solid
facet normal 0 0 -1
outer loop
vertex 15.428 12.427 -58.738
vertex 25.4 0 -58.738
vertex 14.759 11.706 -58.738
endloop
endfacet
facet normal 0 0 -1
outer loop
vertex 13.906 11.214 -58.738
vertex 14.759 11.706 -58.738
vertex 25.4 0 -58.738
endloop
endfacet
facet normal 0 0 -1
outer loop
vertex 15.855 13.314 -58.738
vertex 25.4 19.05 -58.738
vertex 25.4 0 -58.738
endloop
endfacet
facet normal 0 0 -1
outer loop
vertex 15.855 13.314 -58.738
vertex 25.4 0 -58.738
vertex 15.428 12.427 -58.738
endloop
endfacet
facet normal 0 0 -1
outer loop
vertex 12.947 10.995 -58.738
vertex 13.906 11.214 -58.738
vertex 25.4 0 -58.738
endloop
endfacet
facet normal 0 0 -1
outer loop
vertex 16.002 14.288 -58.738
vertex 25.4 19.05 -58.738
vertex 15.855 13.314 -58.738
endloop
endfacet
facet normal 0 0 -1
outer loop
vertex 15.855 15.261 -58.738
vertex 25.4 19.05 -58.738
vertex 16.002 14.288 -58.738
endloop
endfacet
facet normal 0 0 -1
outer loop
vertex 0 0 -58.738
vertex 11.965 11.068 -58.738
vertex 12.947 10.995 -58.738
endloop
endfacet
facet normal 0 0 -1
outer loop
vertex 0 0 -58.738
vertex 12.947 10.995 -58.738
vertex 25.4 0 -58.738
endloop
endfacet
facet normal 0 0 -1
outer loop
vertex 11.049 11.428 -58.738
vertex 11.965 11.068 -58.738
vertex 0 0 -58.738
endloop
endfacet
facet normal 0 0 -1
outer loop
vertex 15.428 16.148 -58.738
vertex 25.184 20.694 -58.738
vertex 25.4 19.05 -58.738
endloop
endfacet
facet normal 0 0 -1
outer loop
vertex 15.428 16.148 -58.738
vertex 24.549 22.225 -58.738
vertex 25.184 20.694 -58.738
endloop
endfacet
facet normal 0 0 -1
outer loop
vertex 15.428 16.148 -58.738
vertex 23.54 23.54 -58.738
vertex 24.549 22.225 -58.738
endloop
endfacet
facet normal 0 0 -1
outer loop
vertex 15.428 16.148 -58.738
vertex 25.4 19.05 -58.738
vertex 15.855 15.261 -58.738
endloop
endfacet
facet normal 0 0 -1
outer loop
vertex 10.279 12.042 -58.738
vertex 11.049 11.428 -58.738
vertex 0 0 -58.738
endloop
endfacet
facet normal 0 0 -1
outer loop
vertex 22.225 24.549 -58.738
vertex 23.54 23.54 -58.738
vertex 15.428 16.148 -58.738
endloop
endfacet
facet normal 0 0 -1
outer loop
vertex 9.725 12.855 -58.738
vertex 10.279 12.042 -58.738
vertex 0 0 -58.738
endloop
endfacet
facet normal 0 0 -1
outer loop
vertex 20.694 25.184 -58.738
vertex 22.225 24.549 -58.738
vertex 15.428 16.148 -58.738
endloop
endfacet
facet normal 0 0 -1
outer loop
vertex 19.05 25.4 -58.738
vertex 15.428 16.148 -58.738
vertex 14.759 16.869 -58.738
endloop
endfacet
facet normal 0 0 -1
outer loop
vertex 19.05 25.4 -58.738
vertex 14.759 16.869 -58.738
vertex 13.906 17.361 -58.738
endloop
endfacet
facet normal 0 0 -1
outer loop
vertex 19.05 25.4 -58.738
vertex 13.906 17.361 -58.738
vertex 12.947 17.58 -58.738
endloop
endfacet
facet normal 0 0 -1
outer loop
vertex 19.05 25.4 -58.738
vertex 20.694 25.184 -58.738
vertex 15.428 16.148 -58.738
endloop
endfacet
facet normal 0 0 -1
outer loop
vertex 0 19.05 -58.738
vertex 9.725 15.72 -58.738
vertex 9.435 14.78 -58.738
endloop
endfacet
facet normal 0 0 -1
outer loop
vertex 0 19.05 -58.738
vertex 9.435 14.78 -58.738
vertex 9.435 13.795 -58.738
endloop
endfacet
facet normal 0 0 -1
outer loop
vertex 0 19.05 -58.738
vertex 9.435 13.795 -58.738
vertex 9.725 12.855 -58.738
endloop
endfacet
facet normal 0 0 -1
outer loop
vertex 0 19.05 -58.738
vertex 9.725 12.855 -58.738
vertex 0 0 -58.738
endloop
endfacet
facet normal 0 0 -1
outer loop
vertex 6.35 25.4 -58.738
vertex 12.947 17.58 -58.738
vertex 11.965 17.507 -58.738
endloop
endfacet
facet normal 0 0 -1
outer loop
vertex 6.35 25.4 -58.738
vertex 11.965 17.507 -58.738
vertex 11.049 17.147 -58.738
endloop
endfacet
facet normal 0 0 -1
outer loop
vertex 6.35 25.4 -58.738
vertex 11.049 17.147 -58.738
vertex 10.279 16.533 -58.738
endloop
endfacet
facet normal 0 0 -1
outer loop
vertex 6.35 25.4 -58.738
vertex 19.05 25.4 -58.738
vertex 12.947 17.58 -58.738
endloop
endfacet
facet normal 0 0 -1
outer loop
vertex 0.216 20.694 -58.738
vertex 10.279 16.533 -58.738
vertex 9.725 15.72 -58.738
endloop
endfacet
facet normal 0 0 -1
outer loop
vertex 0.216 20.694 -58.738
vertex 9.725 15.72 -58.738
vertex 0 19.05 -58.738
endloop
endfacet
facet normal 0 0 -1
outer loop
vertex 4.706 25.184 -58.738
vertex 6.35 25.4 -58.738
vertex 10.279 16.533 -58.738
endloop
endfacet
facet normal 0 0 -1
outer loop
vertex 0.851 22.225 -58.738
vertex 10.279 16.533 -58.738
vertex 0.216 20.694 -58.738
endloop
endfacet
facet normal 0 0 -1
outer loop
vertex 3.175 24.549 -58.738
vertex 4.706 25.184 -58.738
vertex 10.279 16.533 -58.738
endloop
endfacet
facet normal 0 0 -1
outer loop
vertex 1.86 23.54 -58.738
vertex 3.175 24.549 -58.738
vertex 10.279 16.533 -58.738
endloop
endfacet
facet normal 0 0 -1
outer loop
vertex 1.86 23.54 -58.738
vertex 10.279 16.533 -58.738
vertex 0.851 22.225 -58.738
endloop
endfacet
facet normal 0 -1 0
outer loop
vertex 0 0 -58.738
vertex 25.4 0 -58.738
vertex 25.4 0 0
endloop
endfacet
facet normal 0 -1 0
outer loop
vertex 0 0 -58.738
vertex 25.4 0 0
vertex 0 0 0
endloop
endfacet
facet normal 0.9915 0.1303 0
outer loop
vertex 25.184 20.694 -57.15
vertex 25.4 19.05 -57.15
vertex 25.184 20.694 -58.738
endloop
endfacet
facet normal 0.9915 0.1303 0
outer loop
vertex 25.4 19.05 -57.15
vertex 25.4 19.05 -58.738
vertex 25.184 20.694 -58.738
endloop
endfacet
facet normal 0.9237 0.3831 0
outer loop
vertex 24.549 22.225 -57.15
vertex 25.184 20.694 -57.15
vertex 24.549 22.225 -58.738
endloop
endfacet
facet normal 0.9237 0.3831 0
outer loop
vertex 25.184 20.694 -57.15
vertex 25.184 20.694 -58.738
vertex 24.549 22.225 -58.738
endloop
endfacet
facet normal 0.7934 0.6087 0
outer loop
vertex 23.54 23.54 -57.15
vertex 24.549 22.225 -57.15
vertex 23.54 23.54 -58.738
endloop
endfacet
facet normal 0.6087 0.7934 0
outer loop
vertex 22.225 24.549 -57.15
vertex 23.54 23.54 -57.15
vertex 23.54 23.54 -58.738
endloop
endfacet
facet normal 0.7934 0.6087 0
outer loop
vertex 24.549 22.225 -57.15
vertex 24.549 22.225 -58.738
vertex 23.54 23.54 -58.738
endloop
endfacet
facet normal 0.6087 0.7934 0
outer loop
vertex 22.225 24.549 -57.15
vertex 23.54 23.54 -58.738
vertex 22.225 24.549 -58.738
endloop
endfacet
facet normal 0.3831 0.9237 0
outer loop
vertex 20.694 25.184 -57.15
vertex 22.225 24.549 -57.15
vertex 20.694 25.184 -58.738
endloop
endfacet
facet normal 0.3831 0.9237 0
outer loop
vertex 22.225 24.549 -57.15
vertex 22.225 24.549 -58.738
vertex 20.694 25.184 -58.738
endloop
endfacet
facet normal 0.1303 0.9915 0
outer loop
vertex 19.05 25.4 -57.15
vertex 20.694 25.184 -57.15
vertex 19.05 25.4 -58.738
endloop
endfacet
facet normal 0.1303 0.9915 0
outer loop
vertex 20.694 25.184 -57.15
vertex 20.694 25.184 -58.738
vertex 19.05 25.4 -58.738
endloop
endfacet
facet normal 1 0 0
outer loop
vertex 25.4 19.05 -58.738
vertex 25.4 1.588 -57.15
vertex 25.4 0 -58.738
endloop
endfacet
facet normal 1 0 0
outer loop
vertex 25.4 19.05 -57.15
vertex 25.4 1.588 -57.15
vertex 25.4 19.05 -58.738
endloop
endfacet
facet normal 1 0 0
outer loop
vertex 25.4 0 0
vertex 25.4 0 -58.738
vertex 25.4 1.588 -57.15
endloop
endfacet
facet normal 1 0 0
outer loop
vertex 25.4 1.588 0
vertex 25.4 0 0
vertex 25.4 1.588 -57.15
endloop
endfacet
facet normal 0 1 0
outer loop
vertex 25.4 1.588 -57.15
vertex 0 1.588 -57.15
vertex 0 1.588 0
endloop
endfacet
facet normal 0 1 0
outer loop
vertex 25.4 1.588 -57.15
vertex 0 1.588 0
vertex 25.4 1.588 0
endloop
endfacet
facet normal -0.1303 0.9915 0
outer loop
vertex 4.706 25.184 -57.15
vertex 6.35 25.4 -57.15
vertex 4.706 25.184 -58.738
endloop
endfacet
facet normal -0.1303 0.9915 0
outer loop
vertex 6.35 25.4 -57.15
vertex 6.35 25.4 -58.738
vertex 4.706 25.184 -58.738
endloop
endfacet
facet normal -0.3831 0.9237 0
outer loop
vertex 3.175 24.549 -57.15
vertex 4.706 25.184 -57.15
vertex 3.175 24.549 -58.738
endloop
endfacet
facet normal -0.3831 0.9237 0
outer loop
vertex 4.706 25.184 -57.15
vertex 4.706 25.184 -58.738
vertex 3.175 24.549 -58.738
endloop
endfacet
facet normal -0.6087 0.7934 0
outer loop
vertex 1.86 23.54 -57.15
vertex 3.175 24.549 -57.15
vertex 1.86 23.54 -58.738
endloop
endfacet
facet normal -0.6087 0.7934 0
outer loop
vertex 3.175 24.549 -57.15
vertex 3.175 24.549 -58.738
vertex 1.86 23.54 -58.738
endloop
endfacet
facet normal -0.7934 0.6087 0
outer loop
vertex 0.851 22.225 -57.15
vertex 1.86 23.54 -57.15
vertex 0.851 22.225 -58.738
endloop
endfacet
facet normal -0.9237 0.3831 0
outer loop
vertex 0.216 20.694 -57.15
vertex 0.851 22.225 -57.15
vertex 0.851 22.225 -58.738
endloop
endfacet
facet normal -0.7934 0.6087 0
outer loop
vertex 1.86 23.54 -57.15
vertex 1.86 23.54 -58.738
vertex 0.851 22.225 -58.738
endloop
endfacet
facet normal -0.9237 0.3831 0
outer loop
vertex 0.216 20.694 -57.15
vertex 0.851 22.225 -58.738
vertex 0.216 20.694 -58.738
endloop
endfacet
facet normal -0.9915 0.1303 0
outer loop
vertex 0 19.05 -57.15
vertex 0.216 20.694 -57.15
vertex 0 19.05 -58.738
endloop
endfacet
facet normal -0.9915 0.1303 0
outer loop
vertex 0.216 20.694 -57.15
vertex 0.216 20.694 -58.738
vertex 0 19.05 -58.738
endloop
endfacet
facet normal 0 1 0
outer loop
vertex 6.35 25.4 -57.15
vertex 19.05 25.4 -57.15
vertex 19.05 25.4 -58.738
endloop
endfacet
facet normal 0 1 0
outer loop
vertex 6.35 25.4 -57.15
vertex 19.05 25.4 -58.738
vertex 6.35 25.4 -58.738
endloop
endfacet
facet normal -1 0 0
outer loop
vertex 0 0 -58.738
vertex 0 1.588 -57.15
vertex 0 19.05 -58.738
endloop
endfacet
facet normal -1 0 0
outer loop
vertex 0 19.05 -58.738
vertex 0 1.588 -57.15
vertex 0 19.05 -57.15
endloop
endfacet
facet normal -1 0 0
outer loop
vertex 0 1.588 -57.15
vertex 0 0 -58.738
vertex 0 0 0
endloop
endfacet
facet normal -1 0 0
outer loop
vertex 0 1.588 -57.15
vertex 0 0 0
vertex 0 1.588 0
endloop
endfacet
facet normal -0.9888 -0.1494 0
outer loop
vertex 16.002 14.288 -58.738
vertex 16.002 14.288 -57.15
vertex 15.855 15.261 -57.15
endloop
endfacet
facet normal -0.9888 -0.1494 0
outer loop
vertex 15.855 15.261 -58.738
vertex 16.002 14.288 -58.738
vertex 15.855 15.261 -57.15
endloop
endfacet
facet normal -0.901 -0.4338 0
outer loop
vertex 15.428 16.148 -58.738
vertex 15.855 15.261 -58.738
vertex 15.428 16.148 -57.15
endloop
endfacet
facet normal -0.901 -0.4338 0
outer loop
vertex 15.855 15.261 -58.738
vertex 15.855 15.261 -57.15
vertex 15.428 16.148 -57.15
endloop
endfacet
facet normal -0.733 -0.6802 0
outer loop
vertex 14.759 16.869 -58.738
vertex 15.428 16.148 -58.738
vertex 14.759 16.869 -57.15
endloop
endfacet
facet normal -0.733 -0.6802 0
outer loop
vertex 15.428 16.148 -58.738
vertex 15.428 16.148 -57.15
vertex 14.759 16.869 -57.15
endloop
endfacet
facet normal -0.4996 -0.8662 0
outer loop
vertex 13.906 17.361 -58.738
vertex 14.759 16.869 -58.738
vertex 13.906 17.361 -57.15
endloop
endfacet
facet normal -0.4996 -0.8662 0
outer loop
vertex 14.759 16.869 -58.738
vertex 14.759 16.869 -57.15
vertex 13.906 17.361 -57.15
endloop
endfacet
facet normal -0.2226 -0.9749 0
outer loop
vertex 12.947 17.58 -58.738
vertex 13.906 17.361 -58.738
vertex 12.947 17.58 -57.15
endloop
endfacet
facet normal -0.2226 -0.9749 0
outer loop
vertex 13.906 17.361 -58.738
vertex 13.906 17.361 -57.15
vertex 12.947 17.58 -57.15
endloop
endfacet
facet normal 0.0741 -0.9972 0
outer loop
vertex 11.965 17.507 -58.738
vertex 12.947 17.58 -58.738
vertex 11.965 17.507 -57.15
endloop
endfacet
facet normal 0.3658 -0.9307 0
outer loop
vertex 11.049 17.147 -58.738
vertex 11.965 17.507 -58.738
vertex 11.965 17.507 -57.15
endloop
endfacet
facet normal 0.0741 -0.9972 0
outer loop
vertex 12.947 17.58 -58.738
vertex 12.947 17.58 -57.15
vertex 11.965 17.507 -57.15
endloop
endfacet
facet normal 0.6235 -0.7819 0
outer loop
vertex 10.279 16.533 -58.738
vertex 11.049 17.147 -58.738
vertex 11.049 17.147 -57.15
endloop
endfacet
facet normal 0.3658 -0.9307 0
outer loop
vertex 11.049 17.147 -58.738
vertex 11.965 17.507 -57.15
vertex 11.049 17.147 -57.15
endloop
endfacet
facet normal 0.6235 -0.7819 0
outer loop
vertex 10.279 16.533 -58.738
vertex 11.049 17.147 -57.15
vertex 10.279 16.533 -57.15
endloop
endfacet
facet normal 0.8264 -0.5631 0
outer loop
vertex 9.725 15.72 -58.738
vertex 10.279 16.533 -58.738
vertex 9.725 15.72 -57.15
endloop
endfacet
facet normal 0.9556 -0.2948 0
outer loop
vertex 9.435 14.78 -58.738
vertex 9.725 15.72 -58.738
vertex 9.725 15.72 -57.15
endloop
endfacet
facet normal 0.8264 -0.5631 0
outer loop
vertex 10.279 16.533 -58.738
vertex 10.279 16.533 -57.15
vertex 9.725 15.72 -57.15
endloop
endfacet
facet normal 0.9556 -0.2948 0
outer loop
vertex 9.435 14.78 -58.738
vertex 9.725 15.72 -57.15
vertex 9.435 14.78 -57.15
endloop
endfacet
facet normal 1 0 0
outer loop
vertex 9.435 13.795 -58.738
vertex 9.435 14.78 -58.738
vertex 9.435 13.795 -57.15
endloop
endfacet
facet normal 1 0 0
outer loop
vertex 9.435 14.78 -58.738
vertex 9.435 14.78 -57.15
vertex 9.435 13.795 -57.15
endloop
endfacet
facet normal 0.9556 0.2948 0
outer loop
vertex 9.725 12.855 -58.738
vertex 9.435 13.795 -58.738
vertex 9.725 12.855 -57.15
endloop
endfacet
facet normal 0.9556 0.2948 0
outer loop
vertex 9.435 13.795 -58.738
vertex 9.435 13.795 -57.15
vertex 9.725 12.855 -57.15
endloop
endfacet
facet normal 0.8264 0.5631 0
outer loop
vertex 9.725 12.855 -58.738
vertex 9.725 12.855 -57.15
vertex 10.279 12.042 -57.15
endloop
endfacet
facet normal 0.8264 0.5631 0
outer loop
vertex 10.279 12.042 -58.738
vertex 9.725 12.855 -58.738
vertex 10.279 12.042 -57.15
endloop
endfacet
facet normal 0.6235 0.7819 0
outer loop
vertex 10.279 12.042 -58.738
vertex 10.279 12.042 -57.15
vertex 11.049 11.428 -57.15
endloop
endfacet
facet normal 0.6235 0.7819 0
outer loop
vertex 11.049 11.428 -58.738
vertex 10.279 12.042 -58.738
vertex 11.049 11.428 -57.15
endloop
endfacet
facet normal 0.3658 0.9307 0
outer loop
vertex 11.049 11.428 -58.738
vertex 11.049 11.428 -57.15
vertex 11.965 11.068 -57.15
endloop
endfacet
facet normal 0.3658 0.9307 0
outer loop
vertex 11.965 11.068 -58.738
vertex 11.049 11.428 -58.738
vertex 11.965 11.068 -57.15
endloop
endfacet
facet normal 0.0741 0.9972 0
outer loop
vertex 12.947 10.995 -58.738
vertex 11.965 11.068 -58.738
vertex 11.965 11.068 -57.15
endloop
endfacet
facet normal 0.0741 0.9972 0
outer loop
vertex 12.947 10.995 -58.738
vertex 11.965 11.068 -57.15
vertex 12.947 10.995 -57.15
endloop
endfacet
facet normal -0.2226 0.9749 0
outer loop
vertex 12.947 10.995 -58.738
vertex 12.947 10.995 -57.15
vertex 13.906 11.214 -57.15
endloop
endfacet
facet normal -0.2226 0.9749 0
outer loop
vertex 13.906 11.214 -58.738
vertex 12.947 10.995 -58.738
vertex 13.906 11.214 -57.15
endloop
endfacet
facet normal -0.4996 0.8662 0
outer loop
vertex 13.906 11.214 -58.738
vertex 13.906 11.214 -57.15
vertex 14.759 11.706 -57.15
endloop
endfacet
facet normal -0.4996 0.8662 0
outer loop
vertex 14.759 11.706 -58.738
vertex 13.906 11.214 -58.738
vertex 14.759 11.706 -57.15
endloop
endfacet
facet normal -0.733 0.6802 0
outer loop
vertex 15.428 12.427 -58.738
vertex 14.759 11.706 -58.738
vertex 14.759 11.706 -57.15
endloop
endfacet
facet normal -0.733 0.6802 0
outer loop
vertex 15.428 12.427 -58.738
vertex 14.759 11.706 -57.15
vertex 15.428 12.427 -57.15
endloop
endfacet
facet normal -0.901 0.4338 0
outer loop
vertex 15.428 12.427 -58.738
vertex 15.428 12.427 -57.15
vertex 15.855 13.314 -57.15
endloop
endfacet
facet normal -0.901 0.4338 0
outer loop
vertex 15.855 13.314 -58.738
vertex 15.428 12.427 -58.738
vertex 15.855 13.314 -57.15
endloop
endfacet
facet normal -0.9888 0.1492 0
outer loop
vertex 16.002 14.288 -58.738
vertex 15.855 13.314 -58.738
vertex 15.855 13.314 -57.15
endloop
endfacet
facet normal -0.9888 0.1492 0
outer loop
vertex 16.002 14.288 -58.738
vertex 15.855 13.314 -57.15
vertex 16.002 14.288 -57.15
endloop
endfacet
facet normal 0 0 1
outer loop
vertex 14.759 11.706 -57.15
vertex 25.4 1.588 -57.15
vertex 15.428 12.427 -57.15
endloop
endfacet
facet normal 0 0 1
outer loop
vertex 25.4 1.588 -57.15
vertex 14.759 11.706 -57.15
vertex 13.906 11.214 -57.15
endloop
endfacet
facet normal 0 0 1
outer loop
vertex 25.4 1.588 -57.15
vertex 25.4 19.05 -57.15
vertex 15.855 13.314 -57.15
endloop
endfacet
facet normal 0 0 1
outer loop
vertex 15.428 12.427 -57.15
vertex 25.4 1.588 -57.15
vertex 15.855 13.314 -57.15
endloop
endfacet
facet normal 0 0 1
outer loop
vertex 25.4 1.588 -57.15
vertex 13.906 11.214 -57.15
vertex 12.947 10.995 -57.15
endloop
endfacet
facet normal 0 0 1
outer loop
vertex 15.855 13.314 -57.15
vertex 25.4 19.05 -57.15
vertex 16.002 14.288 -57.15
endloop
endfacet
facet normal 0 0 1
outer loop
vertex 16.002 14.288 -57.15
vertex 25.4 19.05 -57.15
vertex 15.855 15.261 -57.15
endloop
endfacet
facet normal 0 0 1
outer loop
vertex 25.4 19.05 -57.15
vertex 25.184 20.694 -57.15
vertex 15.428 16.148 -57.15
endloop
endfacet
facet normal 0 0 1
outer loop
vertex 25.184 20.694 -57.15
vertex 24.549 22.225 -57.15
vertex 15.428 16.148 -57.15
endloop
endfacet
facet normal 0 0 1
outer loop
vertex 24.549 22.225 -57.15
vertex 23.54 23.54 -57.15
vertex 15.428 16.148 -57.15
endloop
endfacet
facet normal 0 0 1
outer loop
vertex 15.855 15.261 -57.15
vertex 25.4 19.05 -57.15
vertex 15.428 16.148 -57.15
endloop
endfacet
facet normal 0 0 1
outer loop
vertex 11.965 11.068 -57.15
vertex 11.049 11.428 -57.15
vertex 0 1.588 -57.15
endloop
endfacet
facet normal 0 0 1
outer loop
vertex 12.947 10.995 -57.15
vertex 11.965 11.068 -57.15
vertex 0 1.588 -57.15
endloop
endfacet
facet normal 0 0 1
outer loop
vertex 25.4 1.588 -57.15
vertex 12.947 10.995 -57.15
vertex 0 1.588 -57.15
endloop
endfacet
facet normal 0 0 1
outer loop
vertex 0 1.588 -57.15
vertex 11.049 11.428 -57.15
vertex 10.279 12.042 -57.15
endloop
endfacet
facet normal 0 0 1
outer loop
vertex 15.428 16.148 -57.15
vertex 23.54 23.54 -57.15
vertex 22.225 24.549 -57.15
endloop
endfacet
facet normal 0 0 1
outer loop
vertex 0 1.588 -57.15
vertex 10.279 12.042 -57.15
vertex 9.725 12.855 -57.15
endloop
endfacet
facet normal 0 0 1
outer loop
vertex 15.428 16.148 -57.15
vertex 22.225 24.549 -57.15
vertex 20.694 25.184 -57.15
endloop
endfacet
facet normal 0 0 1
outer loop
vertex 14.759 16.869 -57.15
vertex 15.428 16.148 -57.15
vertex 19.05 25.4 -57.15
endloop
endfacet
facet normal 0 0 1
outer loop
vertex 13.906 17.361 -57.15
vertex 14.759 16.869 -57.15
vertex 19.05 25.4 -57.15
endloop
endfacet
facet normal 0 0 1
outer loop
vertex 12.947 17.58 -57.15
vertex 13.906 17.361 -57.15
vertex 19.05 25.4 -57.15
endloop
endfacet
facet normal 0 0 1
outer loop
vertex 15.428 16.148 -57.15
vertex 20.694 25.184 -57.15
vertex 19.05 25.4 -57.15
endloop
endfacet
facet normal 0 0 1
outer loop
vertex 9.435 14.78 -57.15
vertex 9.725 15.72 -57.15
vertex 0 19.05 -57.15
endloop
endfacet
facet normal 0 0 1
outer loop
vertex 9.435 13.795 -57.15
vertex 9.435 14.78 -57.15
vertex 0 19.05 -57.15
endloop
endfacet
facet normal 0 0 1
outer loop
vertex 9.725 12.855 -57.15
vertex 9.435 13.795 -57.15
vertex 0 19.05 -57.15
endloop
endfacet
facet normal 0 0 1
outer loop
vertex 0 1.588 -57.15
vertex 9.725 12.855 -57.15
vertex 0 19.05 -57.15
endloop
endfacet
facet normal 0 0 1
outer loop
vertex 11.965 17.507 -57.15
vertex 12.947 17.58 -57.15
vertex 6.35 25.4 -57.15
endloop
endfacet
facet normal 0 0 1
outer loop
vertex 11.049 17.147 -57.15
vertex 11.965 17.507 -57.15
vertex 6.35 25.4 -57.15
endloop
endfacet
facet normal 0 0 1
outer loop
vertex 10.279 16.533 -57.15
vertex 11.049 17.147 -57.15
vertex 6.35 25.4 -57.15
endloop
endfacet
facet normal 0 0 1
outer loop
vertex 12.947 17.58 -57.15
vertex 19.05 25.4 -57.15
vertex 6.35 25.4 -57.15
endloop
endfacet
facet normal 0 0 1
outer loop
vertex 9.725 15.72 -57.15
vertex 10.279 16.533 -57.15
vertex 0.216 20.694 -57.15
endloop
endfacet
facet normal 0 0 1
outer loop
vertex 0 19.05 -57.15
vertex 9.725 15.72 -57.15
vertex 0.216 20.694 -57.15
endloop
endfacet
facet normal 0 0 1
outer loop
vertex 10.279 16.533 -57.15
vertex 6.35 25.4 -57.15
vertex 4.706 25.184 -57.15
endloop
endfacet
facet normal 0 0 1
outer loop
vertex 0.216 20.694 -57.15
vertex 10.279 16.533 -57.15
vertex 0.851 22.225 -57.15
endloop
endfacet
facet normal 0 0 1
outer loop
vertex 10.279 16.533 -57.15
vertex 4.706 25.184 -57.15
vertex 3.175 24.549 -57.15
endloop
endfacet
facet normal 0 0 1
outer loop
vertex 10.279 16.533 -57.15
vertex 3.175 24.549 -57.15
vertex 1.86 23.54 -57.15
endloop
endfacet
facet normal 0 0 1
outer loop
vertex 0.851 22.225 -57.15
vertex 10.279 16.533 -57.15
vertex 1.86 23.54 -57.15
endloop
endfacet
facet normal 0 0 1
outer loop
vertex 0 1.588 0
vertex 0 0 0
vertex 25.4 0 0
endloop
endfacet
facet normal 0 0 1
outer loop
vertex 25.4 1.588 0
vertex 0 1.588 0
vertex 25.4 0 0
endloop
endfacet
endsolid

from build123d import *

# Parameters (mm, degrees)
SKETCH1_W           = 25.4
SKETCH1_H           = 57.15
BOSS_EXTRUDE1_DEPTH = 1.5875
SKETCH2_W           = 25.4
SKETCH2_H           = 25.4
BOSS_EXTRUDE2_DEPTH = 1.5875
SKETCH3_R           = 3.302
CUT_EXTRUDE1_DEPTH  = 68.501425911
FILLET1_R           = 6.35


with BuildPart() as part:
    # Sketch1 → Boss-Extrude1 (new body)
    with BuildSketch(Plane(origin=(0, 0, 0), x_dir=(1, 0, 0), z_dir=(0, 1, 0))):
        with Locations((12.7, 28.575)):
            Rectangle(SKETCH1_W, SKETCH1_H)
    extrude(amount=BOSS_EXTRUDE1_DEPTH)

    # Sketch2 → Boss-Extrude2 (add)
    with BuildSketch(Plane(origin=(0, 0, -57.15), x_dir=(-1, 0, 0), z_dir=(0, 0, -1))):
        with Locations((-12.7, 12.7)):
            Rectangle(SKETCH2_W, SKETCH2_H)
    extrude(amount=BOSS_EXTRUDE2_DEPTH)

    # Sketch3 → Cut-Extrude1 (cut, through all)
    with BuildSketch(Plane.XY.offset(-57.15)):
        with Locations((12.7, 14.2875)):
            Circle(SKETCH3_R)
    extrude(amount=-CUT_EXTRUDE1_DEPTH, mode=Mode.SUBTRACT)

    # Fillet1
    fillet1_edges = [part.edges().sort_by_distance(p)[0] for p in [
        (25.4, 25.4, -57.94375),
        (0, 25.4, -57.94375),
    ]]
    fillet(fillet1_edges, radius=FILLET1_R)


solid = part.part
